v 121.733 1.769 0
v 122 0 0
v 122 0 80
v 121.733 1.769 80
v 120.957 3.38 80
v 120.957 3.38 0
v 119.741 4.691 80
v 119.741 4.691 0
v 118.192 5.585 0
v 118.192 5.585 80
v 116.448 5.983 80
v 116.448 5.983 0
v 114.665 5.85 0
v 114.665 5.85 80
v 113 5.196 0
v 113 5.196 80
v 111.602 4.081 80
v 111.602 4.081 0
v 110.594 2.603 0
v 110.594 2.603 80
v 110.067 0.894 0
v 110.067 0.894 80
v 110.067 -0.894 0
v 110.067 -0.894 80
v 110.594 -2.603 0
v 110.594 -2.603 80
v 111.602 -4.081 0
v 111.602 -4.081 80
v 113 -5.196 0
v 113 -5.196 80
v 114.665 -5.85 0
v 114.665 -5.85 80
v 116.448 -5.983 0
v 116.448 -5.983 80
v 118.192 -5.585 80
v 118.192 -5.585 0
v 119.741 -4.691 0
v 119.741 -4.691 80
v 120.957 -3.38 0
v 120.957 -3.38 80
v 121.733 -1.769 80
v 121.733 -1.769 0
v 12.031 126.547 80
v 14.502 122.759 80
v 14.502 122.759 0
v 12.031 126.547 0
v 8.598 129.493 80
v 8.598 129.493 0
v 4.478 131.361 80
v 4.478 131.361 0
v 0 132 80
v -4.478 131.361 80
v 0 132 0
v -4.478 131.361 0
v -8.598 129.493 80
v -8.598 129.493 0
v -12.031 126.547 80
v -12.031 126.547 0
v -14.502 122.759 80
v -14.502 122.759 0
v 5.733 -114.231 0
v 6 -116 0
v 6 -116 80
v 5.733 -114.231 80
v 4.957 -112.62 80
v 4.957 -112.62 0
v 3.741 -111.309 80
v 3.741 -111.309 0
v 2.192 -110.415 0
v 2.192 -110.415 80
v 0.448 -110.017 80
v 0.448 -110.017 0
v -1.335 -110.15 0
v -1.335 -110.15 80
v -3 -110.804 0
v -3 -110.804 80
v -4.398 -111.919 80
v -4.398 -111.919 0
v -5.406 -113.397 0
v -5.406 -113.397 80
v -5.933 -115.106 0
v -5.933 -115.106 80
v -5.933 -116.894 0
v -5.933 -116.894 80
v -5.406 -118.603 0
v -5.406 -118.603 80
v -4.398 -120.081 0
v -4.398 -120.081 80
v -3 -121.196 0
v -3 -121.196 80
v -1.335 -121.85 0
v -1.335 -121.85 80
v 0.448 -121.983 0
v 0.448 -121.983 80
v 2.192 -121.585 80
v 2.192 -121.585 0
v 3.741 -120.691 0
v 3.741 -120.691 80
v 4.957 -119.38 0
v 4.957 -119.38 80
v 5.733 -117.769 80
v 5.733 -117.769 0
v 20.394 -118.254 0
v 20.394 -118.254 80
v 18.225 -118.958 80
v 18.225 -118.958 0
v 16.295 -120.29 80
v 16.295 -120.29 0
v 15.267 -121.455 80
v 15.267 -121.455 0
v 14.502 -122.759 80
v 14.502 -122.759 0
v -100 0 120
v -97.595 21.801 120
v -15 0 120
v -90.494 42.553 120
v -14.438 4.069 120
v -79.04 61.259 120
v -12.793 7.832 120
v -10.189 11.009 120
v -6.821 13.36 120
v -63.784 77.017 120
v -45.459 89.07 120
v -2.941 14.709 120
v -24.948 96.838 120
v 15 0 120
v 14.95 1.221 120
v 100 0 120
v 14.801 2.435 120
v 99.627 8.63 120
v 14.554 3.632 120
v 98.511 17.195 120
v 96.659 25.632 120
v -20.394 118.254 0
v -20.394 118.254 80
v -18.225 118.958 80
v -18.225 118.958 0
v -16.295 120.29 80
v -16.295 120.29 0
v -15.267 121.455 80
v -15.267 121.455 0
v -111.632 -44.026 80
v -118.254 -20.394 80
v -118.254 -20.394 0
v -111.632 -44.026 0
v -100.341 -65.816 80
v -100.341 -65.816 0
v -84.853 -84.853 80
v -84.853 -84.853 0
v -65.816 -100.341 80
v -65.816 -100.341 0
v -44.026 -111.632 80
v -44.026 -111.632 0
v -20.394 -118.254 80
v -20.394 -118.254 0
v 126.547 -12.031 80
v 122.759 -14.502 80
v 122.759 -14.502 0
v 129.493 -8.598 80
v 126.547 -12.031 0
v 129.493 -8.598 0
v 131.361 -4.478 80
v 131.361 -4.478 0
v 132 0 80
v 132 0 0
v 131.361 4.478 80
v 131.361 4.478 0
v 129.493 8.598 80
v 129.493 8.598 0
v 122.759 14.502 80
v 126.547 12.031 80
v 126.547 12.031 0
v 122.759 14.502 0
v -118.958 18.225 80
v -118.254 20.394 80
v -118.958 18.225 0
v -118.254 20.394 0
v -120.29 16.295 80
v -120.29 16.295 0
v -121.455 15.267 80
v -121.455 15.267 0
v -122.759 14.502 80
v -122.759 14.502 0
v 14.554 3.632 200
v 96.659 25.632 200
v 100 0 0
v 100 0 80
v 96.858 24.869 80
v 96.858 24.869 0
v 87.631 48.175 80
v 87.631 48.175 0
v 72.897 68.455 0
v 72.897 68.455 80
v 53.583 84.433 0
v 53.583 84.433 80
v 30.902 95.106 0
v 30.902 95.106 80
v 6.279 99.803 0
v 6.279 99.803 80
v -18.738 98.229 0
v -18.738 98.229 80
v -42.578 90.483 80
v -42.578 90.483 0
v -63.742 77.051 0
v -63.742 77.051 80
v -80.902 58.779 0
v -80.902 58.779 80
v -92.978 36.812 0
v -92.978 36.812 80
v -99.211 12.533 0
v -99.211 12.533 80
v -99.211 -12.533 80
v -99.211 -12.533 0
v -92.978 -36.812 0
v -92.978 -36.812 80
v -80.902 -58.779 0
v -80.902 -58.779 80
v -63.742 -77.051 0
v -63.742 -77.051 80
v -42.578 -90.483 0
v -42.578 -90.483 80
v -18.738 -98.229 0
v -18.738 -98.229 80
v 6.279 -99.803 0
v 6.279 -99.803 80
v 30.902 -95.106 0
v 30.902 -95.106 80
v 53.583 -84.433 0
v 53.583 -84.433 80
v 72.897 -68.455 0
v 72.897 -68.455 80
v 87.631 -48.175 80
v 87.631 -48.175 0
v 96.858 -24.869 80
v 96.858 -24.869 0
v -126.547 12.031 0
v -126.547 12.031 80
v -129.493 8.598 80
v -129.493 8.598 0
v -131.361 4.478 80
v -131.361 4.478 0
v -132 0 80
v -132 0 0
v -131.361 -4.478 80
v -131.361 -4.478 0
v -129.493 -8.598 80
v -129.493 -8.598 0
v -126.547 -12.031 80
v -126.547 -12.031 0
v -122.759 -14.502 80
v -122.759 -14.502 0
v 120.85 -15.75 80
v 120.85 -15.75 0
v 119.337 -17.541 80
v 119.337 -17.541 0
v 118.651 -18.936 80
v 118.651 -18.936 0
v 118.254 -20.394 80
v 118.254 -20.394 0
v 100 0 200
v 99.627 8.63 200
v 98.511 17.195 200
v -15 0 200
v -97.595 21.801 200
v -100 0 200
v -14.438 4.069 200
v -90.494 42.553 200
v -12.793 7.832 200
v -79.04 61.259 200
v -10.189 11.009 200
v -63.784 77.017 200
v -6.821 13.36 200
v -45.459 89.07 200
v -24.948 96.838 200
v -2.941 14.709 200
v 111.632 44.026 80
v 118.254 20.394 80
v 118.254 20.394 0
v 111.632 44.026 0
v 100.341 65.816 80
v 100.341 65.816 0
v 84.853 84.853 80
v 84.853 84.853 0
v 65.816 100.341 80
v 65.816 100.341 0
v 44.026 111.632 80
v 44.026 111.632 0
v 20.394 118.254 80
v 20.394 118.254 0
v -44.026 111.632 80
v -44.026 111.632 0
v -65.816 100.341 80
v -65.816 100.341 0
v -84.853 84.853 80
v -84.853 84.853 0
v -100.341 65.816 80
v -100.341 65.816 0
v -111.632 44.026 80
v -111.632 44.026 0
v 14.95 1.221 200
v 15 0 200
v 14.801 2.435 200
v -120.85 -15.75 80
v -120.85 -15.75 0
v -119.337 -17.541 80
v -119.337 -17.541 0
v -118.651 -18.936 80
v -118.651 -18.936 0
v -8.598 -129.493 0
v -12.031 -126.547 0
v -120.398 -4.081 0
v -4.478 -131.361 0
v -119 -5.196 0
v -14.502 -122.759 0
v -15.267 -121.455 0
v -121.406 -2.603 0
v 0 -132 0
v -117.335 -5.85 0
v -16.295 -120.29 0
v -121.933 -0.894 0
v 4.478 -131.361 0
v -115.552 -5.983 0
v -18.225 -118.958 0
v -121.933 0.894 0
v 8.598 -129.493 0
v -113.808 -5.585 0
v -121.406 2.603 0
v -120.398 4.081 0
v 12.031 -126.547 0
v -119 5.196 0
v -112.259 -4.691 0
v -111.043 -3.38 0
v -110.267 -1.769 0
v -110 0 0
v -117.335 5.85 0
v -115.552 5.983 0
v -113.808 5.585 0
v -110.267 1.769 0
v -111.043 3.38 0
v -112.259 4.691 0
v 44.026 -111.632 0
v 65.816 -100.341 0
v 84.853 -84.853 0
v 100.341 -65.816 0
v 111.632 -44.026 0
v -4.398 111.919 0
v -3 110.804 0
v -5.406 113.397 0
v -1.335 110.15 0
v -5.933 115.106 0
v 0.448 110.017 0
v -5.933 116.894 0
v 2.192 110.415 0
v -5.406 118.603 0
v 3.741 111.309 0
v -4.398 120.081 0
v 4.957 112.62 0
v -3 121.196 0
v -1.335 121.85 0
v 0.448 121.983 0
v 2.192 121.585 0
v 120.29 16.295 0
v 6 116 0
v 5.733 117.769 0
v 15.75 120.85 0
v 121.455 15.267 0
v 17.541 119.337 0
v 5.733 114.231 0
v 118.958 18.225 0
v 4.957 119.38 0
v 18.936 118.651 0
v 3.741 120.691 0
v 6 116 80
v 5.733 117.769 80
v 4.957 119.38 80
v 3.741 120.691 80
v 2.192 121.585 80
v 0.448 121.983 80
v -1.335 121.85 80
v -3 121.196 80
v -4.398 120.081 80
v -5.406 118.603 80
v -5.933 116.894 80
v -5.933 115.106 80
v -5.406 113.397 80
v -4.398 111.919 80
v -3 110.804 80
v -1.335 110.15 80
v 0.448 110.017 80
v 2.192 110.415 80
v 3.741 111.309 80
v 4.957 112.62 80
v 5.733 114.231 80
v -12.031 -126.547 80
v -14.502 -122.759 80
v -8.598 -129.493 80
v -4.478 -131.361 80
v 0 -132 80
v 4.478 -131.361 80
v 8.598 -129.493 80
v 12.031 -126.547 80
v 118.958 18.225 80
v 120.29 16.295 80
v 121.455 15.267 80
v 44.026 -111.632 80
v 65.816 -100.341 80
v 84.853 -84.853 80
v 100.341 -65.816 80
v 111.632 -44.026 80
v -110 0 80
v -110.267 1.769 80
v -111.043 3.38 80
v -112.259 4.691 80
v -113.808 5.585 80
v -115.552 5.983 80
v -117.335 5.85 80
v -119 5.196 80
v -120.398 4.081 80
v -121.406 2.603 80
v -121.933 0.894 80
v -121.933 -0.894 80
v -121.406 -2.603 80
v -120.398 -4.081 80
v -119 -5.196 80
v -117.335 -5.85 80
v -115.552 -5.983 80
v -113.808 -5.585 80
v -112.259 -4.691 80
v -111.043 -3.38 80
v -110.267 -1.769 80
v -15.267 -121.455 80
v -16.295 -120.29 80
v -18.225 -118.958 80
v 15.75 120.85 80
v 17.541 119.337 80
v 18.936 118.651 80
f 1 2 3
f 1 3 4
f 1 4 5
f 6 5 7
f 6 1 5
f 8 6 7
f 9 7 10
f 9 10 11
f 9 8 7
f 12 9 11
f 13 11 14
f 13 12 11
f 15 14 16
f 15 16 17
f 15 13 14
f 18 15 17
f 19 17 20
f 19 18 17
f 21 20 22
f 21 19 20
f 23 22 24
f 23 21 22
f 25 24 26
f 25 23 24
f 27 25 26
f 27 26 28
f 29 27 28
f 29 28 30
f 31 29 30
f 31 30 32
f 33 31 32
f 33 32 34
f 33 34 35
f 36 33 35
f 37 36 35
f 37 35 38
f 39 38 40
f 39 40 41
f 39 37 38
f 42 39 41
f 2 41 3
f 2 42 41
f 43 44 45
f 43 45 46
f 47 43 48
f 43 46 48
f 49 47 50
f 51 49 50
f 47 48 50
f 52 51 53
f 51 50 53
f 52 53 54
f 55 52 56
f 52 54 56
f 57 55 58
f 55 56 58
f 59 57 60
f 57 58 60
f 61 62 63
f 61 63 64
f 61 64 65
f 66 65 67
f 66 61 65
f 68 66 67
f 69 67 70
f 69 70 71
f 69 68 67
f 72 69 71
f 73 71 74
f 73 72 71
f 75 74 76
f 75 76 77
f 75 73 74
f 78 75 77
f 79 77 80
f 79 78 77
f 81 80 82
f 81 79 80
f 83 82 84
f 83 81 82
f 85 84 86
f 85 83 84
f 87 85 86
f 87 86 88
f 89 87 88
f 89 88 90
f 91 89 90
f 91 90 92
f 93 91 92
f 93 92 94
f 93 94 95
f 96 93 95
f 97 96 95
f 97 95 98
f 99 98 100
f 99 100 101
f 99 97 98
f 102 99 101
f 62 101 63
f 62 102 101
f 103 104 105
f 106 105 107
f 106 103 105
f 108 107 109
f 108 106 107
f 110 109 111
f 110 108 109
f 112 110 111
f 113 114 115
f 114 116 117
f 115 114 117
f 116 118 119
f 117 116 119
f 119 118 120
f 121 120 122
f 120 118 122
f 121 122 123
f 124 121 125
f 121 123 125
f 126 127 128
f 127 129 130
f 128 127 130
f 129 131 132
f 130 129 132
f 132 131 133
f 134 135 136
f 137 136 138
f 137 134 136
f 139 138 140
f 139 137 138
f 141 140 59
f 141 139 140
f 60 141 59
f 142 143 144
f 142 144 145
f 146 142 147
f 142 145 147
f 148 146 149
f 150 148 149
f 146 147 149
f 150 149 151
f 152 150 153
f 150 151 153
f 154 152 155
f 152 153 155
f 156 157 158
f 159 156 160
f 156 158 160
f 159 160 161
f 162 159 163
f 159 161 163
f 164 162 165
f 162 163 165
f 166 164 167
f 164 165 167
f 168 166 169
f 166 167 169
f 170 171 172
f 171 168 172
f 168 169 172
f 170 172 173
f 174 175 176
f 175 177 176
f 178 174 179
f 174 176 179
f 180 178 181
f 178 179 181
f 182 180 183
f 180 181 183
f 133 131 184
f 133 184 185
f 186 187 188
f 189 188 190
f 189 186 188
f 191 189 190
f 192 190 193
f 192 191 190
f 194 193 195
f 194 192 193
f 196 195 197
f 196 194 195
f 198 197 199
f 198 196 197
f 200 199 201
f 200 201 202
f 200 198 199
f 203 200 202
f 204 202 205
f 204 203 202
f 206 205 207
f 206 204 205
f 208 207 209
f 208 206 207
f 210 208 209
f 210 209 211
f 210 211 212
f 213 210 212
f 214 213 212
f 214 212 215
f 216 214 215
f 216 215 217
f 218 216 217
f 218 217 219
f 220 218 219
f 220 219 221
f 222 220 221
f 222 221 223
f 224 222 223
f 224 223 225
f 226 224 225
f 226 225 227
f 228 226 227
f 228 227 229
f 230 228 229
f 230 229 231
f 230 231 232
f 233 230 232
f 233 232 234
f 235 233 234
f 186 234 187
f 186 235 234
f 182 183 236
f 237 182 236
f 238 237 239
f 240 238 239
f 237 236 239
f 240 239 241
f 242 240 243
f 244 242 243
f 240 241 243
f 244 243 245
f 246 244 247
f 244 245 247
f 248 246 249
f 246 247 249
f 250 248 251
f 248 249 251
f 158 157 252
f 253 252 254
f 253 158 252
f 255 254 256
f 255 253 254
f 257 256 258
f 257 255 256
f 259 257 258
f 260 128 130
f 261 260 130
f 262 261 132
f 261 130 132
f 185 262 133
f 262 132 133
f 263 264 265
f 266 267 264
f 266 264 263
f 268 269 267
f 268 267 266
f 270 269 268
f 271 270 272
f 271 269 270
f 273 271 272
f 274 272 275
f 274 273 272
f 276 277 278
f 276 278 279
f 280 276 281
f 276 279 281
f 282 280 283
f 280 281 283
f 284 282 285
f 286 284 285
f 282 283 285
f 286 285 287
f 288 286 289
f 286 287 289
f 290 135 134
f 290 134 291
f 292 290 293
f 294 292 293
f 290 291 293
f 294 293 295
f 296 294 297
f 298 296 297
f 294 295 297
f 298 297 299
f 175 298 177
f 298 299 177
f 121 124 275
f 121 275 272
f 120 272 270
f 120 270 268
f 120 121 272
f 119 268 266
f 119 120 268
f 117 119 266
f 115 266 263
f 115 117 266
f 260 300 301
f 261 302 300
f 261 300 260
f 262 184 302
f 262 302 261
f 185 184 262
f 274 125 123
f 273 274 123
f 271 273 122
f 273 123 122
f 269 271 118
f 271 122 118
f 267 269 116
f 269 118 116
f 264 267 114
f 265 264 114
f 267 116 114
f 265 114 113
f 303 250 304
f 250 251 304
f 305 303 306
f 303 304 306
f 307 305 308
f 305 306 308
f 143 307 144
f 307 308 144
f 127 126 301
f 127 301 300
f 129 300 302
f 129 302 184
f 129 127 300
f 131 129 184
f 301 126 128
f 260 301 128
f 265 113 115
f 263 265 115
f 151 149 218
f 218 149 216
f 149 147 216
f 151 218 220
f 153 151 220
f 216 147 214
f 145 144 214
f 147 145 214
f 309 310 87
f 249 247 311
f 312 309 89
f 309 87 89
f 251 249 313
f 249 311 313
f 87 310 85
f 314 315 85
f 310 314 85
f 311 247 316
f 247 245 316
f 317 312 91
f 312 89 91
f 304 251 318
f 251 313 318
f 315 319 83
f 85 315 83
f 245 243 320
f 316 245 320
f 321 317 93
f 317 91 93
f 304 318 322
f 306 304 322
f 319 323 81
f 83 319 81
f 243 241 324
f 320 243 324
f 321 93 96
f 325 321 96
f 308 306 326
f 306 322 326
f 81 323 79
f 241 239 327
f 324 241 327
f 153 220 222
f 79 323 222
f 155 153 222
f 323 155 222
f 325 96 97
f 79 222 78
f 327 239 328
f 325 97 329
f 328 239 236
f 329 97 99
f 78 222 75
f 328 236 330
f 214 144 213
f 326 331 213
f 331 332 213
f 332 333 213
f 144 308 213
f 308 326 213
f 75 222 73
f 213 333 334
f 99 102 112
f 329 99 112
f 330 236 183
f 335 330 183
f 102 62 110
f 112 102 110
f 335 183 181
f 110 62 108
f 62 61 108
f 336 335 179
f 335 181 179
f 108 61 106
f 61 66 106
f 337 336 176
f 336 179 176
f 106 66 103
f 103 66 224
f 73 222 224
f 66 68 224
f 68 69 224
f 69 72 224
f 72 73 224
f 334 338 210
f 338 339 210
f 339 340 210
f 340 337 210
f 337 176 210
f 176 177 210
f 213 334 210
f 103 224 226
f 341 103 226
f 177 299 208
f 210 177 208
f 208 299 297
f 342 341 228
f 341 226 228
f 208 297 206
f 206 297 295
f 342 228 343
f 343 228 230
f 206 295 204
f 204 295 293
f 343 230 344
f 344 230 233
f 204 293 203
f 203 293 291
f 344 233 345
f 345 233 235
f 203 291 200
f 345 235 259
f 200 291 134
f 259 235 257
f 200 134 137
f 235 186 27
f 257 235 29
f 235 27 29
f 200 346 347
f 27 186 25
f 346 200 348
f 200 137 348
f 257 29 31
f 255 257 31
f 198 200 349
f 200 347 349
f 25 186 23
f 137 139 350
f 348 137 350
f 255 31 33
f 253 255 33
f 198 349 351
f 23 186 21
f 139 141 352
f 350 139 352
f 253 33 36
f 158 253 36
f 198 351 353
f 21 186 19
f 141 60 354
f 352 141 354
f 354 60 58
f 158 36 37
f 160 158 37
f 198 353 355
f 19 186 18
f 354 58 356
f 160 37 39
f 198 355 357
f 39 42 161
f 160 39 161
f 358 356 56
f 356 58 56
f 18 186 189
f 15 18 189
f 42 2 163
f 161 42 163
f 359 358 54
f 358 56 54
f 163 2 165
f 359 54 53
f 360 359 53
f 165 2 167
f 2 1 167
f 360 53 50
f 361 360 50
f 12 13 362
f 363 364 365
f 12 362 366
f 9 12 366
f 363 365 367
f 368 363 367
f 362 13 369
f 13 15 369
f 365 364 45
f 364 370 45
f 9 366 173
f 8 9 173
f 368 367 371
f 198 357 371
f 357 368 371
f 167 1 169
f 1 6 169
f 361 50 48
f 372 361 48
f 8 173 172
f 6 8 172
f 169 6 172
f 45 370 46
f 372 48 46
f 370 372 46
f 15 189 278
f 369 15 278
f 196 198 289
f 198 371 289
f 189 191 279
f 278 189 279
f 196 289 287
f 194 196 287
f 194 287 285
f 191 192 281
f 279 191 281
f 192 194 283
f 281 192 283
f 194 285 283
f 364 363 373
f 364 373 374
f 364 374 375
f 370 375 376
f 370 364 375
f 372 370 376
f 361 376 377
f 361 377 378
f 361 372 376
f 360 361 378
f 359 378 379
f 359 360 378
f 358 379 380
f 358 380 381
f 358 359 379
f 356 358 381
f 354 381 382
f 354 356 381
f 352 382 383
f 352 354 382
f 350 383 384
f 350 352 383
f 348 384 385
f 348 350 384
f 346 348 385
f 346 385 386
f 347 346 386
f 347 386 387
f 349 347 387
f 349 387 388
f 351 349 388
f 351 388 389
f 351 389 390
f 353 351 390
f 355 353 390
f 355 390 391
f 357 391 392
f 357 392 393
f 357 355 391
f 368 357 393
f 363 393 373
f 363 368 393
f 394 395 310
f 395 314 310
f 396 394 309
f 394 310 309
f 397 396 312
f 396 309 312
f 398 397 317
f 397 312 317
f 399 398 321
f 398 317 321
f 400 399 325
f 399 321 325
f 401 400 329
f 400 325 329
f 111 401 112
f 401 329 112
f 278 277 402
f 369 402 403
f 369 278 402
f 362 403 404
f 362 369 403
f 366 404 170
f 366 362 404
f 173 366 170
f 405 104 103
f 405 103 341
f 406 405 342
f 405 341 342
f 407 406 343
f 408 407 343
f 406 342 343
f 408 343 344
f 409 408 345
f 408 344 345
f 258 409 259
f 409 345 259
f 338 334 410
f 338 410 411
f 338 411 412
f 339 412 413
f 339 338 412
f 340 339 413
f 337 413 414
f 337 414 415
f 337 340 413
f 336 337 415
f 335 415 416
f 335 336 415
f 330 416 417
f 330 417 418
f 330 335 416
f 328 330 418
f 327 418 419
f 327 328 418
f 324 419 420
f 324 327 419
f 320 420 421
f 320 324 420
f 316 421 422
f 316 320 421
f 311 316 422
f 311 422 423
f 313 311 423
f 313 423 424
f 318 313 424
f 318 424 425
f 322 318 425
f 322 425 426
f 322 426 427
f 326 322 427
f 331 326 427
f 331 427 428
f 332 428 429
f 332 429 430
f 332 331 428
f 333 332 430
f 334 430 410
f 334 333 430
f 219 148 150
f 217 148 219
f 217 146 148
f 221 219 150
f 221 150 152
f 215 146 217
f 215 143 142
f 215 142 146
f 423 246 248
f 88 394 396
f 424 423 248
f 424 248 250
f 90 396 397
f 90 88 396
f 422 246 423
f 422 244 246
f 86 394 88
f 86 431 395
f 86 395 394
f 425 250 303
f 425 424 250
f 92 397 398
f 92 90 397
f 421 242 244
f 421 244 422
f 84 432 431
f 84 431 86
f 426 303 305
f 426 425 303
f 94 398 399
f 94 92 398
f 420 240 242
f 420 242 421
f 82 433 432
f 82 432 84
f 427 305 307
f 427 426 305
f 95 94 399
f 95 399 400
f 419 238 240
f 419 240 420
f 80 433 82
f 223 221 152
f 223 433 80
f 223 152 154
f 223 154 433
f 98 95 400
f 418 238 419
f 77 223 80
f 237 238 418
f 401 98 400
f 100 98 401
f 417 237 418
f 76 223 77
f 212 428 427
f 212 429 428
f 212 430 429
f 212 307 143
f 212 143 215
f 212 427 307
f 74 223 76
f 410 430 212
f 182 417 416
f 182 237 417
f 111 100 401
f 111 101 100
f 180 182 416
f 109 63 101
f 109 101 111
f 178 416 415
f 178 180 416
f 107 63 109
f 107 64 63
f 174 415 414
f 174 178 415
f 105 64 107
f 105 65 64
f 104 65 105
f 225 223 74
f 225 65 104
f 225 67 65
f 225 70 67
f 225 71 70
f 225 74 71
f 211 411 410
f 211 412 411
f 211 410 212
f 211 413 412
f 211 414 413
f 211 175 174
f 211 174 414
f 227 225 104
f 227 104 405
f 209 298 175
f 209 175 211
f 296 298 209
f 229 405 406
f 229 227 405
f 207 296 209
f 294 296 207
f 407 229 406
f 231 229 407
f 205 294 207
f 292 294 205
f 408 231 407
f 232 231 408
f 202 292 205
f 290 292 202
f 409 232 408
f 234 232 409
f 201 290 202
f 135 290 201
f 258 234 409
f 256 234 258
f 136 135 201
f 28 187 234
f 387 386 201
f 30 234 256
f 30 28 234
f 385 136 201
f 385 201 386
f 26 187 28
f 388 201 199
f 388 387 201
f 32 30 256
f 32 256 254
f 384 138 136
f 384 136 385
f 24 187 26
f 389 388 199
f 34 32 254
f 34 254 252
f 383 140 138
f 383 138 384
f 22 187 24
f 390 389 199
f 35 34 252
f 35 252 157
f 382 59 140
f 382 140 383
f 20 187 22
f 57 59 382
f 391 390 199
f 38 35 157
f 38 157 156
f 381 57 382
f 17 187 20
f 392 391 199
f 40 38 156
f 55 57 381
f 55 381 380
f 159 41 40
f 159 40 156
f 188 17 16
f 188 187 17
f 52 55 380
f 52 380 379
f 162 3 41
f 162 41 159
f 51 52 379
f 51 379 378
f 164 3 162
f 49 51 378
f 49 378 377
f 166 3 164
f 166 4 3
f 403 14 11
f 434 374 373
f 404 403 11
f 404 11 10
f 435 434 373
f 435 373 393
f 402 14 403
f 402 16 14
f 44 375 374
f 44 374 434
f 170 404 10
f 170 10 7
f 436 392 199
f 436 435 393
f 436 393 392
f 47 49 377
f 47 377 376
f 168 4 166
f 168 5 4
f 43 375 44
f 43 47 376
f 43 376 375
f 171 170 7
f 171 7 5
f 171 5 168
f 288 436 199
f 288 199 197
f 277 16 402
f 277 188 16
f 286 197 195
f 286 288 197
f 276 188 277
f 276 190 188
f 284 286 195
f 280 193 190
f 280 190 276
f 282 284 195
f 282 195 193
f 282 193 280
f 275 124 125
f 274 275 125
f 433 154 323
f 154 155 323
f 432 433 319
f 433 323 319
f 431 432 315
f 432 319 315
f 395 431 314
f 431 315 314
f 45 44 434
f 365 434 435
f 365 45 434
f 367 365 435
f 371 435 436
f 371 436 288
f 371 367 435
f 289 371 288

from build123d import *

# Parameters (mm, degrees)
CYLINDER006_R       = 6
CYLINDER006_DEPTH   = 80
CYLINDER007_R       = 6
CYLINDER007_DEPTH   = 80
CYLINDER008_R       = 6
CYLINDER008_DEPTH   = 80
CYLINDER009_R       = 6
CYLINDER009_DEPTH   = 80
CYLINDER002_R       = 16
CYLINDER002_DEPTH   = 80
CYLINDER003_R       = 16
CYLINDER003_DEPTH   = 80
CYLINDER004_R       = 16
CYLINDER004_DEPTH   = 80
CYLINDER005_R       = 16
CYLINDER005_DEPTH   = 80
CYLINDER001_R       = 100
CYLINDER001_DEPTH   = 200
CYLINDER_R          = 120
CYLINDER_DEPTH      = 80
FILLET_R            = 8
FILLET001_R         = 8
FILLET002_R         = 8
BOX_W               = 400
BOX_H               = 200
BOX_DEPTH           = 80
BOX_PLACEMENT_ANGLE = 15
BOX001_W            = 200
BOX001_H            = 200
BOX001_DEPTH        = 80
TUBE_R              = 100
TUBE_R_2            = 15
TUBE_DEPTH          = 80


with BuildPart() as walec006:
    # Cylinder006 → Cylinder006 (new body)
    with BuildSketch(Plane(origin=(116, 0, 0), x_dir=(1, 0, 0), z_dir=(0, 0, 1))):
        Circle(CYLINDER006_R)
    extrude(amount=CYLINDER006_DEPTH)


with BuildPart() as walec007:
    # Cylinder007 → Cylinder007 (new body)
    with BuildSketch(Plane(origin=(-116, 0, 0), x_dir=(1, 0, 0), z_dir=(0, 0, 1))):
        Circle(CYLINDER007_R)
    extrude(amount=CYLINDER007_DEPTH)


with BuildPart() as walec008:
    # Cylinder008 → Cylinder008 (new body)
    with BuildSketch(Plane(origin=(0, 116, 0), x_dir=(1, 0, 0), z_dir=(0, 0, 1))):
        Circle(CYLINDER008_R)
    extrude(amount=CYLINDER008_DEPTH)


with BuildPart() as walec009:
    # Cylinder009 → Cylinder009 (new body)
    with BuildSketch(Plane(origin=(0, -116, 0), x_dir=(1, 0, 0), z_dir=(0, 0, 1))):
        Circle(CYLINDER009_R)
    extrude(amount=CYLINDER009_DEPTH)


with BuildPart() as walec002:
    # Cylinder002 → Cylinder002 (new body)
    with BuildSketch(Plane(origin=(116, 0, 0), x_dir=(1, 0, 0), z_dir=(0, 0, 1))):
        Circle(CYLINDER002_R)
    extrude(amount=CYLINDER002_DEPTH)


with BuildPart() as walec003:
    # Cylinder003 → Cylinder003 (new body)
    with BuildSketch(Plane(origin=(-116, 0, 0), x_dir=(1, 0, 0), z_dir=(0, 0, 1))):
        Circle(CYLINDER003_R)
    extrude(amount=CYLINDER003_DEPTH)


with BuildPart() as walec004:
    # Cylinder004 → Cylinder004 (new body)
    with BuildSketch(Plane(origin=(0, 116, 0), x_dir=(1, 0, 0), z_dir=(0, 0, 1))):
        Circle(CYLINDER004_R)
    extrude(amount=CYLINDER004_DEPTH)


with BuildPart() as walec005:
    # Cylinder005 → Cylinder005 (new body)
    with BuildSketch(Plane(origin=(0, -116, 0), x_dir=(1, 0, 0), z_dir=(0, 0, 1))):
        Circle(CYLINDER005_R)
    extrude(amount=CYLINDER005_DEPTH)


with BuildPart() as walec001:
    # Cylinder001 → Cylinder001 (new body)
    with BuildSketch(Plane.XY):
        Circle(CYLINDER001_R)
    extrude(amount=CYLINDER001_DEPTH)


with BuildPart() as fillet002:
    # Cylinder → Cylinder (new body)
    with BuildSketch(Plane.XY):
        Circle(CYLINDER_R)
    extrude(amount=CYLINDER_DEPTH)

    # Cut: cut Walec001
    add(walec001.part, mode=Mode.SUBTRACT)

    # Fusion: union Walec002, Walec003, Walec004, Walec005
    add(walec002.part)
    add(walec003.part)
    add(walec004.part)
    add(walec005.part)

    # Cut001: cut Walec009
    add(walec009.part, mode=Mode.SUBTRACT)

    # Cut002: cut Walec008
    add(walec008.part, mode=Mode.SUBTRACT)

    # Cut003: cut Walec007
    add(walec007.part, mode=Mode.SUBTRACT)

    # Cut004: cut Walec006
    add(walec006.part, mode=Mode.SUBTRACT)

    # Fillet
    fillet_edges = [fillet002.edges().sort_by_distance(p)[0] for p in [
        (-15.722777, 118.965517, 40),
    ]]
    fillet(fillet_edges, radius=FILLET_R)

    # Fillet001
    fillet001_edges = [fillet002.edges().sort_by_distance(p)[0] for p in [
        (15.722777, 118.965517, 40),
    ]]
    fillet(fillet001_edges, radius=FILLET001_R)

    # Fillet002
    fillet002_edges = [fillet002.edges().sort_by_distance(p)[0] for p in [
        (118.965517, 15.722777, 40),
        (-118.965517, 15.722777, 40),
        (118.965517, -15.722777, 40),
        (-118.965517, -15.722777, 40),
        (-15.722777, -118.965517, 40),
        (15.722777, -118.965517, 40),
    ]]
    fillet(fillet002_edges, radius=FILLET002_R)


with BuildPart() as sze_cian:
    # Box → Box (new body)
    with BuildSketch(Plane.XY):
        with Locations((200, 100)):
            Rectangle(BOX_W, BOX_H)
    extrude(amount=BOX_DEPTH)


with BuildPart() as sze_cian_1:
    # Box placement: moved
    add(sze_cian.part.moved(Location((1, 0, 120))).rotate(Axis((1, 0, 120), (0, 0, 1)), BOX_PLACEMENT_ANGLE))


with BuildPart() as sze_cian001:
    # Box001 → Box001 (new body)
    with BuildSketch(Plane(origin=(-100, -200, 120), x_dir=(1, 0, 0), z_dir=(0, 0, 1))):
        with Locations((100, 100)):
            Rectangle(BOX001_W, BOX001_H)
    extrude(amount=BOX001_DEPTH)


with BuildPart() as cut006:
    # Tube → Tube (new body)
    with BuildSketch(Plane.XY.offset(120)):
        Circle(TUBE_R)
        Circle(TUBE_R_2, mode=Mode.SUBTRACT)
    extrude(amount=TUBE_DEPTH)

    # Cut005: cut Sześcian001
    add(sze_cian001.part, mode=Mode.SUBTRACT)

    # Cut006: cut Sześcian
    add(sze_cian_1.part, mode=Mode.SUBTRACT)


solid = Compound([fillet002.part, cut006.part])
